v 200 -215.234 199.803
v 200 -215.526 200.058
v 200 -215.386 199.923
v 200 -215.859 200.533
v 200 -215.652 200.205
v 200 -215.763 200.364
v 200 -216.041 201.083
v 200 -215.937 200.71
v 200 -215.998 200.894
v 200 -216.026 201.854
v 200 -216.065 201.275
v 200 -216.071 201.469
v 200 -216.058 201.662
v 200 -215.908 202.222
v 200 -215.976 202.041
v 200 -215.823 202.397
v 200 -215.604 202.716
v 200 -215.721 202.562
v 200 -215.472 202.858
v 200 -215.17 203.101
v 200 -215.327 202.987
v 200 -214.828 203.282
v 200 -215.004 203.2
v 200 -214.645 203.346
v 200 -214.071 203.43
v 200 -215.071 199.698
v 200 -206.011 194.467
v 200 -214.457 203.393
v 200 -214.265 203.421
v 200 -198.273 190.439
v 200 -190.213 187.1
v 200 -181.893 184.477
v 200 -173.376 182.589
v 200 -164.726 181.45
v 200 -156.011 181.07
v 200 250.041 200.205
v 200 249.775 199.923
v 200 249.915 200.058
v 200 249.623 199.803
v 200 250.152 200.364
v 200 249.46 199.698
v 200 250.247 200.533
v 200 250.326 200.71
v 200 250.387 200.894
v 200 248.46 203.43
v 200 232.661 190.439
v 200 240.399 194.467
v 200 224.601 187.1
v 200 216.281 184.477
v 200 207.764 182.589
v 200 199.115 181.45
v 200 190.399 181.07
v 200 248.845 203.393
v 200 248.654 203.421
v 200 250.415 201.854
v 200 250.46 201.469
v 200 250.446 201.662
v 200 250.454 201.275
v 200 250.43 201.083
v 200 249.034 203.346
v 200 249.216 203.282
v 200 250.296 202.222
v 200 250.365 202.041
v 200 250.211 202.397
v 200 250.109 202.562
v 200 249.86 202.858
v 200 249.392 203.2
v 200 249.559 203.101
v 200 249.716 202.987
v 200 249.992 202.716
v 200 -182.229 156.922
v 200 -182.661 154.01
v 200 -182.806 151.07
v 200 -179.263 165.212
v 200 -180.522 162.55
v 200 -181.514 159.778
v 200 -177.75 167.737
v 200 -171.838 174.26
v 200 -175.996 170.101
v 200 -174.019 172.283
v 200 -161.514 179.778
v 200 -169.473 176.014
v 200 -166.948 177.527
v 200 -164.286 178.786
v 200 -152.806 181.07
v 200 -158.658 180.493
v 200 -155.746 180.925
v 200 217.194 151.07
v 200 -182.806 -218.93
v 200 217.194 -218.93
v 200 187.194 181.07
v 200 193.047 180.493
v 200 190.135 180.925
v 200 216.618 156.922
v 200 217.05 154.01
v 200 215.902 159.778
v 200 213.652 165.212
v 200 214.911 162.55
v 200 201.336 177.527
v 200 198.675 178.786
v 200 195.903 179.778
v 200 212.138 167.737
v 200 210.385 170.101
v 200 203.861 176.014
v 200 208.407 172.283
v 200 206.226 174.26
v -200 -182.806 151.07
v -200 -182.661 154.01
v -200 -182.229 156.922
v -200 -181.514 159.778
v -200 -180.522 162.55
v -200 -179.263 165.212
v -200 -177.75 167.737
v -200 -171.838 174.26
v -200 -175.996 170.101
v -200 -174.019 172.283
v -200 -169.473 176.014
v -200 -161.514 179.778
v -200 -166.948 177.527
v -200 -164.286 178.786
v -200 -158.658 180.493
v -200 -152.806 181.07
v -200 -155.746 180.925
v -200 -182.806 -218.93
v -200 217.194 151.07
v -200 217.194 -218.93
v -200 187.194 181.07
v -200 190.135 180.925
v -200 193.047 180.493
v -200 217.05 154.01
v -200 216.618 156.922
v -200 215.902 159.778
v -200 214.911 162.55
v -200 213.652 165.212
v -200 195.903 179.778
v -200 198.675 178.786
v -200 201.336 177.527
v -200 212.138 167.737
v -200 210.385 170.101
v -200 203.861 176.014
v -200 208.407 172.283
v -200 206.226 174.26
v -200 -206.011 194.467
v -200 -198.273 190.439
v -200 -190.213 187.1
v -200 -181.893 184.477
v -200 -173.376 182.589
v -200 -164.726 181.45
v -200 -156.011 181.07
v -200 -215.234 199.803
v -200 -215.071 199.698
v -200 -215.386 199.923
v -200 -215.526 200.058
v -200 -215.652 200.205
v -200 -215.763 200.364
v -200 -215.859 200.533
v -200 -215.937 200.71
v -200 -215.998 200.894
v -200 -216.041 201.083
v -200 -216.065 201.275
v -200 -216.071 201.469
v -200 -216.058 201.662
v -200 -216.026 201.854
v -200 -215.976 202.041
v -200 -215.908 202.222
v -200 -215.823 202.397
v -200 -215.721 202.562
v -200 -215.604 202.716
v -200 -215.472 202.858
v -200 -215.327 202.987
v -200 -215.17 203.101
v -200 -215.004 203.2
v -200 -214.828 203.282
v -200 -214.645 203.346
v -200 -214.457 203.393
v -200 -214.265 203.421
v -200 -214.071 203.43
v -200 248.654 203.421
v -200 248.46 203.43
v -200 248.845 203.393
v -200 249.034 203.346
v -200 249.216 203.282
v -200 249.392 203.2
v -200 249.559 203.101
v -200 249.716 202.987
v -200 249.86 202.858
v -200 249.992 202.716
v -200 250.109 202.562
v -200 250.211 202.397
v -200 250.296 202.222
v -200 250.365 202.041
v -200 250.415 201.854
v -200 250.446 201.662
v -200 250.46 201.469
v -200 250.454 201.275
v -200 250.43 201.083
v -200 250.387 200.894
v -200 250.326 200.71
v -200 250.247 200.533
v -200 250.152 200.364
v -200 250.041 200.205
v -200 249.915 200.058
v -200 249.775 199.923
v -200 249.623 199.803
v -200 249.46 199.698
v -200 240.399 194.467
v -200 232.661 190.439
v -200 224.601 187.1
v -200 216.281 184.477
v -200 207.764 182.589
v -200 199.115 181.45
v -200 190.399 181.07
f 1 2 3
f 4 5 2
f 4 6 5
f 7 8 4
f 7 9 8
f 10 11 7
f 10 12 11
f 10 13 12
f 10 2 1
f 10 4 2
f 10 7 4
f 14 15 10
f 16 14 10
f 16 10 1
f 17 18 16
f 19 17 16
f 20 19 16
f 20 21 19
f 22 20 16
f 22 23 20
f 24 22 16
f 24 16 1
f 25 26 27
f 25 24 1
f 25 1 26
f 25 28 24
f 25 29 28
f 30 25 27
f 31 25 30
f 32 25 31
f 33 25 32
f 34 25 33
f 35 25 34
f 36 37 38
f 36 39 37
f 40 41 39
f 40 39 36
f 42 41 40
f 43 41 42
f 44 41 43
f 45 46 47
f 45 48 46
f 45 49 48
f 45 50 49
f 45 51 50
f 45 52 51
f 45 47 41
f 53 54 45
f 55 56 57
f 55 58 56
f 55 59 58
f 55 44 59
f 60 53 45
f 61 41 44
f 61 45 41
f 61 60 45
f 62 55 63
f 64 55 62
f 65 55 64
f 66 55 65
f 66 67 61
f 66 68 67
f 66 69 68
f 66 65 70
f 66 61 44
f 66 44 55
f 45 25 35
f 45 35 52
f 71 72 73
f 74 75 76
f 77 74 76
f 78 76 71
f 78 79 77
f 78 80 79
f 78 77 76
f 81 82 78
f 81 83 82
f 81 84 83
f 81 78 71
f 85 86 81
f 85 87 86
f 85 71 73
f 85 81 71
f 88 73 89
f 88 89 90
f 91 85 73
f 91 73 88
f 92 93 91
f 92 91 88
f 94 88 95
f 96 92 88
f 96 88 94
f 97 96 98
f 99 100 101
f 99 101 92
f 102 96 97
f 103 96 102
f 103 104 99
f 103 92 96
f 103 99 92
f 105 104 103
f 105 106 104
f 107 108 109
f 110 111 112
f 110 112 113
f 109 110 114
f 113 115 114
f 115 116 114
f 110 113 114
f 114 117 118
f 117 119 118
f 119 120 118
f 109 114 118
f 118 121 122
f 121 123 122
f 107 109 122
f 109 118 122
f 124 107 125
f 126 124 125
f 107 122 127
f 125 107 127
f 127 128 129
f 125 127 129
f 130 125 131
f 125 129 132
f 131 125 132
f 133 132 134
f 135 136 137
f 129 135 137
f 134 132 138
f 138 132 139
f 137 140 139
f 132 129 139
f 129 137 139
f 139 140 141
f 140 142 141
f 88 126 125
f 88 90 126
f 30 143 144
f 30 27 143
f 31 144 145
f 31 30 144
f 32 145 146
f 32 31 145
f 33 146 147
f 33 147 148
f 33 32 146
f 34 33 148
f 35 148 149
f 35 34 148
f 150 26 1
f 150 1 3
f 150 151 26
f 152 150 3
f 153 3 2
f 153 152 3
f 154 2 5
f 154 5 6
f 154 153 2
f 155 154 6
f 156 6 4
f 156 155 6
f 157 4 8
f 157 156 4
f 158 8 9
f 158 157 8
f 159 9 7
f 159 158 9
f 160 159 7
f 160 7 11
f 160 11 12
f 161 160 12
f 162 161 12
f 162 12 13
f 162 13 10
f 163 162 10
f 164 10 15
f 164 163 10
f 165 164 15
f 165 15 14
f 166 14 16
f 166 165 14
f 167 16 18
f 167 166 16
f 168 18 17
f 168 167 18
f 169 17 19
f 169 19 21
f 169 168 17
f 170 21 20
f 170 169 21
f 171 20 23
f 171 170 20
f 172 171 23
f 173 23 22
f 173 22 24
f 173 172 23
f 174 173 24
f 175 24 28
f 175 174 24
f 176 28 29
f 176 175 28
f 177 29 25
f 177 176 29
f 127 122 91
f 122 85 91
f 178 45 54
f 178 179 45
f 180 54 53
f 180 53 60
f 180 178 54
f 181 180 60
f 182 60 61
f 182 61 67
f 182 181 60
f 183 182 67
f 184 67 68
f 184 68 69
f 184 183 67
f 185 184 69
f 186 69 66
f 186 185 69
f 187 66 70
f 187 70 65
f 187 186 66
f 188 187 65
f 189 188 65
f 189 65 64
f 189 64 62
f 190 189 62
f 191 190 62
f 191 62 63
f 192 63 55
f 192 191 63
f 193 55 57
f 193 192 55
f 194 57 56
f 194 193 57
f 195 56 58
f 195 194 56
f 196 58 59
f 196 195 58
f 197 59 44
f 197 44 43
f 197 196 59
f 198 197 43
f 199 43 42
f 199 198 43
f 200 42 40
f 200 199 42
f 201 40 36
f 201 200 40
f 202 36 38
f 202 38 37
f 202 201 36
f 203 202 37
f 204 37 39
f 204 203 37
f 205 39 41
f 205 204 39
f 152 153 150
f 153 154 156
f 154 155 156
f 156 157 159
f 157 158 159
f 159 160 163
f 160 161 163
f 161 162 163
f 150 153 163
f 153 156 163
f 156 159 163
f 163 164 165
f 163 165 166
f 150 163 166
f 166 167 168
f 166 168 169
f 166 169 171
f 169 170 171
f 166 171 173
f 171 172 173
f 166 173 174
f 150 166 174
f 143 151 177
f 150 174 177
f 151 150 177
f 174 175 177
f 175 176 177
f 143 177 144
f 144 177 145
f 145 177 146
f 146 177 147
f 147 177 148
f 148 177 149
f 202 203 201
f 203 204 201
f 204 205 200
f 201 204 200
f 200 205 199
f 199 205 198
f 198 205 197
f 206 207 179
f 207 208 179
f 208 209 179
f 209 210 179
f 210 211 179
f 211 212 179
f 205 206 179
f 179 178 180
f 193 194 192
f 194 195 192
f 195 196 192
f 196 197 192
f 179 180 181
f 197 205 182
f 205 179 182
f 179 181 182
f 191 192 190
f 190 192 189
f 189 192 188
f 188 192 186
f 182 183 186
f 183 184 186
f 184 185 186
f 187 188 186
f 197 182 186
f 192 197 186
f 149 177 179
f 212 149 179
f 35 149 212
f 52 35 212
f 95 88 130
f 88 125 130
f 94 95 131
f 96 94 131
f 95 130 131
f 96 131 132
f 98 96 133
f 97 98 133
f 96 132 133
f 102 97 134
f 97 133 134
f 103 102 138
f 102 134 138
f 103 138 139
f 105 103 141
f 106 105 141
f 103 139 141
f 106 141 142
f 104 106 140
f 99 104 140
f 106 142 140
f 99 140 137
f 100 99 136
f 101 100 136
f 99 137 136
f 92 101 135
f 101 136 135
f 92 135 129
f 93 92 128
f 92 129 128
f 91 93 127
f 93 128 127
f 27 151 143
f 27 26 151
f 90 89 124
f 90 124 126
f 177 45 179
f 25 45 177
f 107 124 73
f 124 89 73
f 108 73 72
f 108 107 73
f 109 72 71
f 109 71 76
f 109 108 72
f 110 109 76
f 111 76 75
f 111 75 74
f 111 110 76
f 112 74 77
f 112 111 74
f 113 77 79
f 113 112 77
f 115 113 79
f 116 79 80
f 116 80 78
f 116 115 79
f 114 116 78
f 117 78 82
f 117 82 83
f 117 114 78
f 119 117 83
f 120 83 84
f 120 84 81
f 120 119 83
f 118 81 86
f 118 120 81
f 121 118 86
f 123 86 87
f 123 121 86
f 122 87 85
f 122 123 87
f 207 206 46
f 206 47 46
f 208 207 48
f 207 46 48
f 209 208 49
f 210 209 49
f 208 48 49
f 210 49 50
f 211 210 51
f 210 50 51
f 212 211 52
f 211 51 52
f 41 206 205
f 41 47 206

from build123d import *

# Parameters (mm, degrees)
F0_W     = 400
F0_H     = 400
F1_DEPTH = 200
F2_DEPTH = 200
F3_R     = 30
F4_R     = 100
F5_R     = 2


with BuildPart() as f1:
    # F0 (on Right) → F1 (new body, symmetric)
    with BuildSketch(Plane.YZ):
        with Locations((17.194282782, -18.9303885745)):
            Rectangle(F0_W, F0_H)
    extrude(amount=F1_DEPTH, both=True)

    # F3
    f3_edges = [f1.edges().sort_by_distance(p)[0] for p in [
        (0, -182.805717, 181.069611),
        (0, 217.194283, 181.069611),
    ]]
    fillet(f3_edges, radius=F3_R)


with BuildPart() as f2:
    # F0 (on Right) → F2 (new body, symmetric)
    with BuildSketch(Plane.YZ):
        Polygon((-221.5355506801, 203.4302912005), (-182.805717218, 181.0696114255), (217.194282782, 181.0696114255), (255.9241162441, 203.4302912005), align=None)
    extrude(amount=F2_DEPTH, both=True)

    # F4
    f4_edges = [f2.edges().sort_by_distance(p)[0] for p in [
        (0, 217.194283, 181.069611),
        (0, -182.805717, 181.069611),
    ]]
    fillet(f4_edges, radius=F4_R)

    # F5
    f5_edges = [f2.edges().sort_by_distance(p)[0] for p in [
        (0, 255.924116, 203.430291),
        (0, -221.535551, 203.430291),
    ]]
    fillet(f5_edges, radius=F5_R)


solid = Compound([f1.part, f2.part])
